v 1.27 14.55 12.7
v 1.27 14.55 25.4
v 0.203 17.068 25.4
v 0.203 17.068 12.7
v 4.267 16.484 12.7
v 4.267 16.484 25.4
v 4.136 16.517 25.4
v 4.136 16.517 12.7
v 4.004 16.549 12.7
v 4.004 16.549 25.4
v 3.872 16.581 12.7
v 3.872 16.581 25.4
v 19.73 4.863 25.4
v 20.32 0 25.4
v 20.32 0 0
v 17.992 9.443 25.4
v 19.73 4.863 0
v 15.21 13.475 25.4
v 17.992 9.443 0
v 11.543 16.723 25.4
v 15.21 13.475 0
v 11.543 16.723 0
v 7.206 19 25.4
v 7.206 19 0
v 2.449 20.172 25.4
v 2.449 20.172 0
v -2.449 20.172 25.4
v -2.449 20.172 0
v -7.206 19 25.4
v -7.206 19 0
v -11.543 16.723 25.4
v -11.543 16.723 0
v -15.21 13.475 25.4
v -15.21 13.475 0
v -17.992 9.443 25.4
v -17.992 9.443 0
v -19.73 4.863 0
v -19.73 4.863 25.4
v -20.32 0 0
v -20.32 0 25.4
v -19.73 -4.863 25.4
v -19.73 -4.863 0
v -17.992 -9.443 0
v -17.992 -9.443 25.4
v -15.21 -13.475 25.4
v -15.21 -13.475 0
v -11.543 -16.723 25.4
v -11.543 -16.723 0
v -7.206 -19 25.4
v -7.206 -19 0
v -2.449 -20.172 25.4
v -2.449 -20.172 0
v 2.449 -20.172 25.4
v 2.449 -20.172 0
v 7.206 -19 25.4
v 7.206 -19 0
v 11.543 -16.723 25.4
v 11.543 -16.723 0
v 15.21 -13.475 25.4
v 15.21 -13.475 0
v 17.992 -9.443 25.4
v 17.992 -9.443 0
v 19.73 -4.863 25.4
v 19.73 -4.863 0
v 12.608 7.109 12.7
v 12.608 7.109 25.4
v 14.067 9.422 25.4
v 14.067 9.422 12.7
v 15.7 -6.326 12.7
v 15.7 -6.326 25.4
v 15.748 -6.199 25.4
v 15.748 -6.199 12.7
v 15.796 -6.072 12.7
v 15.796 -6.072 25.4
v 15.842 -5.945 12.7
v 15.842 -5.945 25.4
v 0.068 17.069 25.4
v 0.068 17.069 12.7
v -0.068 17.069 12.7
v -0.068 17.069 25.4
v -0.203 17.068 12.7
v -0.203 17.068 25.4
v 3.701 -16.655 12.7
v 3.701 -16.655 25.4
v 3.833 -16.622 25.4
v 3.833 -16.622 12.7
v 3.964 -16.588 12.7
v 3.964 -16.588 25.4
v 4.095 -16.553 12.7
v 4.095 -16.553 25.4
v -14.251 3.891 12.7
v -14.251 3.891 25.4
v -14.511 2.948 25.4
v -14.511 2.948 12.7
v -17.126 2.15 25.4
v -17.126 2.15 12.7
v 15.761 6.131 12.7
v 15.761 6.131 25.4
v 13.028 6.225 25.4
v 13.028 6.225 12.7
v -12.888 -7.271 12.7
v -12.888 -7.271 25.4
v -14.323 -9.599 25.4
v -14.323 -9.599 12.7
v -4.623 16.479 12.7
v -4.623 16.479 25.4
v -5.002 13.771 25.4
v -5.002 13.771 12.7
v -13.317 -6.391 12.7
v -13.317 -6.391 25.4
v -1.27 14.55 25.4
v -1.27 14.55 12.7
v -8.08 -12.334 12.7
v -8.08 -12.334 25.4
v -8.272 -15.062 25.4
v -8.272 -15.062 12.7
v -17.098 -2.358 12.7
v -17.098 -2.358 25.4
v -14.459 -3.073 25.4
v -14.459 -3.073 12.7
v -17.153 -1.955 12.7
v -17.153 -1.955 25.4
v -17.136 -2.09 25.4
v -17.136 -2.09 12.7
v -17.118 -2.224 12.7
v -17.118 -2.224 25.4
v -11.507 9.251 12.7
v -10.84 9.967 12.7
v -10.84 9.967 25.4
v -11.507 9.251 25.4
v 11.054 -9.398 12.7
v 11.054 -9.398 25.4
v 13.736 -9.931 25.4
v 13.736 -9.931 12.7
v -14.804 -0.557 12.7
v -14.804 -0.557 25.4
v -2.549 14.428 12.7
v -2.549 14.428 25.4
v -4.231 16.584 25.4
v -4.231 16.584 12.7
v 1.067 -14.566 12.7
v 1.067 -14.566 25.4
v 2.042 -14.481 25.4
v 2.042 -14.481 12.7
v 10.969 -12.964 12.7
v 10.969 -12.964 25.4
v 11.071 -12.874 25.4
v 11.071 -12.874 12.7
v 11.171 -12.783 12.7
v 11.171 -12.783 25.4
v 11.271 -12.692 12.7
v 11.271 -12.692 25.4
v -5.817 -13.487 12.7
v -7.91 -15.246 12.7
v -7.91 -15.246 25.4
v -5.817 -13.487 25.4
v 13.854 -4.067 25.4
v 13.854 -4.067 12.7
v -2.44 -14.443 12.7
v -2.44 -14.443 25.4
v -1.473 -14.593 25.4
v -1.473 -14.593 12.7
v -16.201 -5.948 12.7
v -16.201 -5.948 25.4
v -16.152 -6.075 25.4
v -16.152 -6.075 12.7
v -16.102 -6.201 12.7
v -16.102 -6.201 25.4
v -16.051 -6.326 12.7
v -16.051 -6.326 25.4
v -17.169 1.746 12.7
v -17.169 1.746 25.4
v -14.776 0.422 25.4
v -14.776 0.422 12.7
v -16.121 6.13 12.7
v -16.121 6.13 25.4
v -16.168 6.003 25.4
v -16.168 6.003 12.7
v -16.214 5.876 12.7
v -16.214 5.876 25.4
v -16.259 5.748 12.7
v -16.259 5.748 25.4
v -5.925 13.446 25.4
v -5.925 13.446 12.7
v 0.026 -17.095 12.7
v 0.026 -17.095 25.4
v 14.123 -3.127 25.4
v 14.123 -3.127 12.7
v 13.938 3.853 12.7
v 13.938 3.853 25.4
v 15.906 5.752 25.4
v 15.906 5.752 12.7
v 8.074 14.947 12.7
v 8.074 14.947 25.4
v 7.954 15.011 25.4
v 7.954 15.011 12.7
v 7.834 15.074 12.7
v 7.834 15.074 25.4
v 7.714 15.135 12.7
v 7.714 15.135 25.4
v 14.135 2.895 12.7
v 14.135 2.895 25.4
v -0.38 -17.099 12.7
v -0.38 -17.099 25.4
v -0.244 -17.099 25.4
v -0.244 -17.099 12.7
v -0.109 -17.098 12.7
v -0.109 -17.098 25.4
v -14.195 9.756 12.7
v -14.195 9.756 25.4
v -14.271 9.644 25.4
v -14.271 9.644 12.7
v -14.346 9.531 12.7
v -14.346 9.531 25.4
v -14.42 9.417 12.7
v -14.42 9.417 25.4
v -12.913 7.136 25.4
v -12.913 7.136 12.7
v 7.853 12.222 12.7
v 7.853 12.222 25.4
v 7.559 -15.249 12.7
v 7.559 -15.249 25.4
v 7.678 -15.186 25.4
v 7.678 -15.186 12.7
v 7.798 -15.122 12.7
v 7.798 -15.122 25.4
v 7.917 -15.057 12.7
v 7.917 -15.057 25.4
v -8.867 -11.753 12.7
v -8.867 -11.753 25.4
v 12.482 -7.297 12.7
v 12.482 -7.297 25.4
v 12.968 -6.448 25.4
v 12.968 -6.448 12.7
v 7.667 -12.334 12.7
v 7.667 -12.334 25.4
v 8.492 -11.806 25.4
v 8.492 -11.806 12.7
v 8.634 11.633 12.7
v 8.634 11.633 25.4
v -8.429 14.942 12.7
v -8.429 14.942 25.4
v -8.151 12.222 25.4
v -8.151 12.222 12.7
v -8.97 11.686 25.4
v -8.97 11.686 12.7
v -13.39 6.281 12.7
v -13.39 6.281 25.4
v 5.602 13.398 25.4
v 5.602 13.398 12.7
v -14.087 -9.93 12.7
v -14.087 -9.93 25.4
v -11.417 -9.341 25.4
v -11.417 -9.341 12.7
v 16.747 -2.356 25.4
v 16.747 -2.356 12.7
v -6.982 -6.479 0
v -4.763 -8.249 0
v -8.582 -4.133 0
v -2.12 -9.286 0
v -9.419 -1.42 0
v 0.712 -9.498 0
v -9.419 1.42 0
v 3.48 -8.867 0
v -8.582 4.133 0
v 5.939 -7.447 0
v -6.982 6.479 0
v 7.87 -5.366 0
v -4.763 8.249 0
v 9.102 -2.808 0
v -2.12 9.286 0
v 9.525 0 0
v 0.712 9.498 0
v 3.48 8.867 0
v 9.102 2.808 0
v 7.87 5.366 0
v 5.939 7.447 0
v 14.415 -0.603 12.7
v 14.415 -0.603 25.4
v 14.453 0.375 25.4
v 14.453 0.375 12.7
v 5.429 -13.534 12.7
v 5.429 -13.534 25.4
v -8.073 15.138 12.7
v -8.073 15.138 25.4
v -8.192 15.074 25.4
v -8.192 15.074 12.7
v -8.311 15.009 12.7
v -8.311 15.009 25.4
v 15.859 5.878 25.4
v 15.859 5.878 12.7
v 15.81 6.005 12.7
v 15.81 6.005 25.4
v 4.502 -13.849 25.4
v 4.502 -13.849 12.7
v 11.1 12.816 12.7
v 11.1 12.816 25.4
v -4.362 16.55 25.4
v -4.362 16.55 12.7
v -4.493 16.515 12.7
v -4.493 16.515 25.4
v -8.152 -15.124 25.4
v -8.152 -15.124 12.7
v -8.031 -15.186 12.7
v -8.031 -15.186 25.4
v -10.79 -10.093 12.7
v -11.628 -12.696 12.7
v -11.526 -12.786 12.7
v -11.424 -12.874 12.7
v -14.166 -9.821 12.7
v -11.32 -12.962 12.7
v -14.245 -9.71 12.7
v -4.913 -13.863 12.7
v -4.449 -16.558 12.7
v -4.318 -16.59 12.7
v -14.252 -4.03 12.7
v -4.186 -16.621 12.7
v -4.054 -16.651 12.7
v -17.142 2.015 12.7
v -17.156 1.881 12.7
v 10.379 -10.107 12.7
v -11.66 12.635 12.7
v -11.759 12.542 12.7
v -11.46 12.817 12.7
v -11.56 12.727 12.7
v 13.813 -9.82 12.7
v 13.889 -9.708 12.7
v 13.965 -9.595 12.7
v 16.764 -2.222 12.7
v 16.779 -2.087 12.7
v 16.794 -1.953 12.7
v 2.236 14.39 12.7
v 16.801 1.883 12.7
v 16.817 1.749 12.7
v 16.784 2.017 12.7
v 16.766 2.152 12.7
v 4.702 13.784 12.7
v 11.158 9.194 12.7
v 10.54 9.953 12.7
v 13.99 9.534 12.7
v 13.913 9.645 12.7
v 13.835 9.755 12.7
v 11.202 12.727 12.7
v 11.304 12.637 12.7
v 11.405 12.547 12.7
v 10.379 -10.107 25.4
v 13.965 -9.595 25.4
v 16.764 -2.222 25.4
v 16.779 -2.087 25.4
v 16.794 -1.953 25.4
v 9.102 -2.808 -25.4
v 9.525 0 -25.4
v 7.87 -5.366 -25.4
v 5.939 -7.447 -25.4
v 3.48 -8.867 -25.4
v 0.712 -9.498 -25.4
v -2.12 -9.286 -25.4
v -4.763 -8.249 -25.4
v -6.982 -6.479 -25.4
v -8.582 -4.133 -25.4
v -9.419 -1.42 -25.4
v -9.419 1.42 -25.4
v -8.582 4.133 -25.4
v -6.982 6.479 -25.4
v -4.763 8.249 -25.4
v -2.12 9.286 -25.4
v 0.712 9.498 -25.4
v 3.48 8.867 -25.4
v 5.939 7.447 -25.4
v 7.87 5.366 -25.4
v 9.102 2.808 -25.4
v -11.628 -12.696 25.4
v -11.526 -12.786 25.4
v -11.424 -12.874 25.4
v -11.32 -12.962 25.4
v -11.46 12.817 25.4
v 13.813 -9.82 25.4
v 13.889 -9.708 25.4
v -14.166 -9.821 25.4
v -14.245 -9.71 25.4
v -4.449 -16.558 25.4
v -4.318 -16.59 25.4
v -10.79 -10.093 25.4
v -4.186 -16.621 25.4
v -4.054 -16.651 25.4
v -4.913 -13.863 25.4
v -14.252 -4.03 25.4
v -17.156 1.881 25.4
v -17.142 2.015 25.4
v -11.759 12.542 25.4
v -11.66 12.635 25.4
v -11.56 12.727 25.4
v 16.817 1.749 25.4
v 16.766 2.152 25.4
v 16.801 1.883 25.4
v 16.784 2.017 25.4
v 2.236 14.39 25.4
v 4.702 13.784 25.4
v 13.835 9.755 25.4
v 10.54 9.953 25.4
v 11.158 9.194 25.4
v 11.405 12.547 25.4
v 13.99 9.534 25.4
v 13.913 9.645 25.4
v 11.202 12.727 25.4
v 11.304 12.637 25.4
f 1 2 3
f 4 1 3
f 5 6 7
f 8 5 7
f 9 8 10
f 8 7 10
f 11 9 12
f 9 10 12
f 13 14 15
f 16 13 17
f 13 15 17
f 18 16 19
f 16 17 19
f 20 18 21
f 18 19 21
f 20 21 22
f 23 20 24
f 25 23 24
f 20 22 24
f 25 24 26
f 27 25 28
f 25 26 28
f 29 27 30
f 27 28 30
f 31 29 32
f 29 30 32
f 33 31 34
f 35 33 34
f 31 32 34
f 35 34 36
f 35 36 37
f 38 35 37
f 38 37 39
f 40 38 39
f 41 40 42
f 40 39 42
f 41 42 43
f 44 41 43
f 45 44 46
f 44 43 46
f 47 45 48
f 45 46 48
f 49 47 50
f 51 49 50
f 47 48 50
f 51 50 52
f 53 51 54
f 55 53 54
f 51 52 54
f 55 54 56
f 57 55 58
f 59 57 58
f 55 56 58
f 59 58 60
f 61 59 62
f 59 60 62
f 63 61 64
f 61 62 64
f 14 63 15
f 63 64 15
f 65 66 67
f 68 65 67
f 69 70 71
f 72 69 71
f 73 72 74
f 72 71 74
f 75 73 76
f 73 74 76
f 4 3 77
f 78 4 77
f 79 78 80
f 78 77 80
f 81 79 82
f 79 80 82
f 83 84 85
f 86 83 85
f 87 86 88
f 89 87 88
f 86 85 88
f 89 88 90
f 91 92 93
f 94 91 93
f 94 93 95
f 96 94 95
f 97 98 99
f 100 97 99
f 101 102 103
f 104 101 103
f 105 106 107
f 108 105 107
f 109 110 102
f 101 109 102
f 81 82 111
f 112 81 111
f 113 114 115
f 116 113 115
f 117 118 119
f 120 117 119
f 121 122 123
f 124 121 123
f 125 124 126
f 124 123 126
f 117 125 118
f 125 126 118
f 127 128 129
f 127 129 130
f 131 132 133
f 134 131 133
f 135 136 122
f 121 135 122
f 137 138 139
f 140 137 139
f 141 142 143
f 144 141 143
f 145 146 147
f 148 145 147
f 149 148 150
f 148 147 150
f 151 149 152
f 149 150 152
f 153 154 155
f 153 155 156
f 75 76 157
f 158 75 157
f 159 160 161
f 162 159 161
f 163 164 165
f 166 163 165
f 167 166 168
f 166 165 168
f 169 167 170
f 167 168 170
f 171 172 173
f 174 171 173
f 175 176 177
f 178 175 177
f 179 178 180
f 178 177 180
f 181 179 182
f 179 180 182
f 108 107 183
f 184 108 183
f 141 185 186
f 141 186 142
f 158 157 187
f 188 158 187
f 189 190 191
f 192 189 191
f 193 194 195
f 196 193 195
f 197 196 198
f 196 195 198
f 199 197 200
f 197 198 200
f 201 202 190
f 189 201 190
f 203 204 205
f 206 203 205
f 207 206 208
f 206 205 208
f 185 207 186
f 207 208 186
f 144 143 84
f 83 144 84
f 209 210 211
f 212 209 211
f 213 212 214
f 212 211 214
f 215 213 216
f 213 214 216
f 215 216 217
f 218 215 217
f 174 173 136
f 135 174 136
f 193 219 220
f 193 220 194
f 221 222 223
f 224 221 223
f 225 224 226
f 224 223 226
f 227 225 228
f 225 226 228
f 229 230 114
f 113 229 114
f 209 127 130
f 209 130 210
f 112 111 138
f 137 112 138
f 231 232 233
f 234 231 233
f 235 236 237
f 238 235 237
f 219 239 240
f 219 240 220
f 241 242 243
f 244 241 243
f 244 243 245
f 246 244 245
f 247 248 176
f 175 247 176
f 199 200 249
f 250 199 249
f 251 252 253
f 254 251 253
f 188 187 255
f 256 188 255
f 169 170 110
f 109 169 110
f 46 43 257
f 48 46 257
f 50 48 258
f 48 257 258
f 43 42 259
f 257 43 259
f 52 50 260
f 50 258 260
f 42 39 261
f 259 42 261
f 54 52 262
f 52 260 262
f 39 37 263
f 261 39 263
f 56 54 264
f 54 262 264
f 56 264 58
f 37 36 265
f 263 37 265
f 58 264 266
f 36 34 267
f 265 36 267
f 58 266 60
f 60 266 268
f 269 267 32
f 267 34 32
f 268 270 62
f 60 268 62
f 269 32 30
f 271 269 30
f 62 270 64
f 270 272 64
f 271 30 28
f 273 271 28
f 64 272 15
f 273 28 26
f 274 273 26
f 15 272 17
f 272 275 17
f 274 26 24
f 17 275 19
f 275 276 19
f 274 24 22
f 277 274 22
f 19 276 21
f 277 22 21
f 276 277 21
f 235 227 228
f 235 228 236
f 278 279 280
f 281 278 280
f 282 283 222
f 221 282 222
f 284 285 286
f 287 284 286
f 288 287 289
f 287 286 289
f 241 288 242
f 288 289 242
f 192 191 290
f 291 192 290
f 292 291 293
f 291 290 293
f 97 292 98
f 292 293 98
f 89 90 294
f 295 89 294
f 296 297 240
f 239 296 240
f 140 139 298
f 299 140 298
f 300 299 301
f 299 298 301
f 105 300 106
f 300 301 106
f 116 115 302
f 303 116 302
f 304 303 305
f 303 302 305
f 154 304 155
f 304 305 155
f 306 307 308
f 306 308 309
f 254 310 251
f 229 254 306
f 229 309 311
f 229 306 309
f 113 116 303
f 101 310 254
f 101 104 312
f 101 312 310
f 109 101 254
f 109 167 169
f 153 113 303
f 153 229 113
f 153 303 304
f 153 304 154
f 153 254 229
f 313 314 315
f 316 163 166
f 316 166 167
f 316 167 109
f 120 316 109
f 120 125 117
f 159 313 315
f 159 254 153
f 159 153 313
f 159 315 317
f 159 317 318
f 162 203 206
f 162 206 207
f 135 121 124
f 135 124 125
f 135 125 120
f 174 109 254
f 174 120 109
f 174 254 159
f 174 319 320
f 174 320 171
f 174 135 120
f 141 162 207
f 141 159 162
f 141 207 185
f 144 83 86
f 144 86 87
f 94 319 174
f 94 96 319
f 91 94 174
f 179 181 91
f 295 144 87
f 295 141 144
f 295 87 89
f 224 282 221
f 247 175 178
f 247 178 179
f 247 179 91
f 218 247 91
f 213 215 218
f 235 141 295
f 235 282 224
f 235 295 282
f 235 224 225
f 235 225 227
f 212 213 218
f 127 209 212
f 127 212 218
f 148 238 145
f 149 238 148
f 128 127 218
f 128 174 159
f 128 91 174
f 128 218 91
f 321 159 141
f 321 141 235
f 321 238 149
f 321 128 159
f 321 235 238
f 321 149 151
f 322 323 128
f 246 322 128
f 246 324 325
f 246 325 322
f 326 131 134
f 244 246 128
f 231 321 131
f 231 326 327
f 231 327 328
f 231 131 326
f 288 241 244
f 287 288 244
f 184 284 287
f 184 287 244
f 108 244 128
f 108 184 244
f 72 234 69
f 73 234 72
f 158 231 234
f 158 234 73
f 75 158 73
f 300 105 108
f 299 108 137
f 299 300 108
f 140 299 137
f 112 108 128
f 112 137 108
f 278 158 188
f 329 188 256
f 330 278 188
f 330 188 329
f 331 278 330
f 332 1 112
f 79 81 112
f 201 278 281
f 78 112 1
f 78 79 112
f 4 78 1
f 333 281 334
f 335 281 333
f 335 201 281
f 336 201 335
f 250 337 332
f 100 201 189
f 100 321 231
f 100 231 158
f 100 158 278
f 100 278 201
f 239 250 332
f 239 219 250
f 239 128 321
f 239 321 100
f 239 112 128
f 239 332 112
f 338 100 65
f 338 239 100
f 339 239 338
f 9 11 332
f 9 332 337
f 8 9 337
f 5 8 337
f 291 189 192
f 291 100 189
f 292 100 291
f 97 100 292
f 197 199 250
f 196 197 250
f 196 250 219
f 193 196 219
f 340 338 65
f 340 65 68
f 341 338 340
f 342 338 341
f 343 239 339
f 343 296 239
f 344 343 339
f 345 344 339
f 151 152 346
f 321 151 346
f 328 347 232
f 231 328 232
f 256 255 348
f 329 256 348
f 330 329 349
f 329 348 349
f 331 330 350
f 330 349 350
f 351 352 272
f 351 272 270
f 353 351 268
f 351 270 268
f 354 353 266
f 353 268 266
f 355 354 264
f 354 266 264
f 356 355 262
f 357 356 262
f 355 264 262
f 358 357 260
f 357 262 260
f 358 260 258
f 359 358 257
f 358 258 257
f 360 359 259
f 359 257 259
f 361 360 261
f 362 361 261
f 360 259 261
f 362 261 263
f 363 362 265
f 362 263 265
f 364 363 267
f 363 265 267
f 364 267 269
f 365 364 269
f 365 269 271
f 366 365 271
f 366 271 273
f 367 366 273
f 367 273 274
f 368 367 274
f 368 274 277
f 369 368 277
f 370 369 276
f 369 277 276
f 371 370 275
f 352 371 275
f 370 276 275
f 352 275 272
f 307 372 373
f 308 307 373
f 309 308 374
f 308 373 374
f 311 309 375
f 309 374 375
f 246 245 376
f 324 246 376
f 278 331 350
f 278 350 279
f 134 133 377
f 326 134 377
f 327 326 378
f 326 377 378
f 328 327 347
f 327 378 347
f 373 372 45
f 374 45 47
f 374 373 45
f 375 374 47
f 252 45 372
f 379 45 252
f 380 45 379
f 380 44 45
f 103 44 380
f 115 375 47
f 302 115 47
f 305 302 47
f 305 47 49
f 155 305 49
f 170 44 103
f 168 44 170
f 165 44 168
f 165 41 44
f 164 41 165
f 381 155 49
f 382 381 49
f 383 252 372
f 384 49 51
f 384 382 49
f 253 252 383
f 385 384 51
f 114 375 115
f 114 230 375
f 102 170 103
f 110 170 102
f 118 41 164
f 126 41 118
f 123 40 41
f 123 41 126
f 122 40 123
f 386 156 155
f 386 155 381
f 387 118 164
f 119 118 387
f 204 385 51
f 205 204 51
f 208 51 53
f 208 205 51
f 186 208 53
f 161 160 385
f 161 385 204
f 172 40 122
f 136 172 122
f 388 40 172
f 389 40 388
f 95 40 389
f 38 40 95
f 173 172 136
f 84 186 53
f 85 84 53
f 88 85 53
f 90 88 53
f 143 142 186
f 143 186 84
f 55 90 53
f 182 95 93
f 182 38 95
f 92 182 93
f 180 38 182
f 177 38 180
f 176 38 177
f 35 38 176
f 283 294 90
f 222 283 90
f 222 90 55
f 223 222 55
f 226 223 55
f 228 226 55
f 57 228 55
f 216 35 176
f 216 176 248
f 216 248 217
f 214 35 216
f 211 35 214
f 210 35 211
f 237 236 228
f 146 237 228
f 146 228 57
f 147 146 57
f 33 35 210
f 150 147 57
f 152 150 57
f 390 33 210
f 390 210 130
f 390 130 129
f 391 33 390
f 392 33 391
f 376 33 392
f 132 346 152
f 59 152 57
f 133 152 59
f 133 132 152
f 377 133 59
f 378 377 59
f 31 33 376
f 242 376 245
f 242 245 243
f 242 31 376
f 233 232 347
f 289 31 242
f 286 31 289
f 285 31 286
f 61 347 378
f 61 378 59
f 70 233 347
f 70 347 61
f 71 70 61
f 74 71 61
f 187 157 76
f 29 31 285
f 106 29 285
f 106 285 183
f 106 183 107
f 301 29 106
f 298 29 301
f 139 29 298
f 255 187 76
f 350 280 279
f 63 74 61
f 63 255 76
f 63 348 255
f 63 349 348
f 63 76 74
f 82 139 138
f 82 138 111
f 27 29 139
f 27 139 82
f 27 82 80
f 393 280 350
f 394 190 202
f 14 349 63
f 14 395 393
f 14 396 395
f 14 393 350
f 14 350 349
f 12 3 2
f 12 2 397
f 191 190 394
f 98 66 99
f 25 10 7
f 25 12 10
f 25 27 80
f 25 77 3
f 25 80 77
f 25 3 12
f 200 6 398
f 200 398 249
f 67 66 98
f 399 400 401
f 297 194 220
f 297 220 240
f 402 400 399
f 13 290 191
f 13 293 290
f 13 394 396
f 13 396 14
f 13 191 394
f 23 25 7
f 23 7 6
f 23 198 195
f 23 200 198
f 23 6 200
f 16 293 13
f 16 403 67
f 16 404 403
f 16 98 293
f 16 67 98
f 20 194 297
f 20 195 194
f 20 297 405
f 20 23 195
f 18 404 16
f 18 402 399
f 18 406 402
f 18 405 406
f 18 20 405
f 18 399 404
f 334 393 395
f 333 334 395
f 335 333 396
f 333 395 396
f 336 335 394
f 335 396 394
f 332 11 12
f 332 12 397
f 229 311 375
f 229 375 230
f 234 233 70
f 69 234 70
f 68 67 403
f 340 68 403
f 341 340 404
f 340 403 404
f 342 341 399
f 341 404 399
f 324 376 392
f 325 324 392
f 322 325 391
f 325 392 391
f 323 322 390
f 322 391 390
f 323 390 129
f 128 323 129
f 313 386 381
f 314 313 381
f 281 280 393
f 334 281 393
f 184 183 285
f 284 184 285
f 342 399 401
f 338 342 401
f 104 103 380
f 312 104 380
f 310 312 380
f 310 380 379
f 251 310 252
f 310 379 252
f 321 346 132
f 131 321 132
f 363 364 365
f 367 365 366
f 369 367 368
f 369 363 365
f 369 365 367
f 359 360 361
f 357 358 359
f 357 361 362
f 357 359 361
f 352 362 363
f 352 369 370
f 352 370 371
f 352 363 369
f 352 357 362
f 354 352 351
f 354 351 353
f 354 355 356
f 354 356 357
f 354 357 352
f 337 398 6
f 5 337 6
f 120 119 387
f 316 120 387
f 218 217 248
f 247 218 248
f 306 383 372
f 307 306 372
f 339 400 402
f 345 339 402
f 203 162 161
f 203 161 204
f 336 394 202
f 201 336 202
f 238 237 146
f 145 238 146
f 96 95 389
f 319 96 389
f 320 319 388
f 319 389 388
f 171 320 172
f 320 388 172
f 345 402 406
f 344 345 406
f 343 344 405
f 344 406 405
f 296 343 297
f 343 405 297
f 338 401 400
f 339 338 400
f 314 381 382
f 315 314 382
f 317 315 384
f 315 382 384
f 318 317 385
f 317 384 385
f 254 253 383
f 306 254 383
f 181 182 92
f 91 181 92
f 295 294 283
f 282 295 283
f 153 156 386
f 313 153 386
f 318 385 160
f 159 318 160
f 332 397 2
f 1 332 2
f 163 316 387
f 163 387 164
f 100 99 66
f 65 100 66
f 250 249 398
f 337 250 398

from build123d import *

# Parameters (mm, degrees)
F0_R     = 20.32
F1_DEPTH = 25.4
F3_DEPTH = 12.7
F4_R     = 9.525
F5_DEPTH = 25.4


with BuildPart() as f1:
    # F0 (on Top) → F1 (new body)
    with BuildSketch(Plane.XY):
        Circle(F0_R)
    extrude(amount=F1_DEPTH)

    # F2 (on face) → F3 (cut)
    with BuildSketch(Plane.XY.offset(25.4)):
        with BuildLine():
            Line((1.27, 14.549678), (0.2032, 17.06759))
            ThreePointArc((0.2032, 17.06759), (0, 17.0688), (-0.2032, 17.06759))
            Line((-0.2032, 17.06759), (-1.27, 14.549678))
            Line((-1.27, 14.549678), (-2.5488, 14.428136))
            Line((-2.5488, 14.428136), (-4.230933, 16.584145))
            ThreePointArc((-4.230933, 16.584145), (-4.427523, 16.532721), (-4.623486, 16.478961))
            Line((-4.623486, 16.478961), (-5.002252, 13.770736))
            Line((-5.002252, 13.770736), (-5.925394, 13.445678))
            Line((-5.925394, 13.445678), (-8.073251, 15.138207))
            ThreePointArc((-8.073251, 15.138207), (-8.2519, 15.041375), (-8.429382, 14.942423))
            Line((-8.429382, 14.942423), (-8.151213, 12.222024))
            Line((-8.151213, 12.222024), (-8.970171, 11.686149))
            Line((-8.970171, 11.686149), (-11.459754, 12.817486))
            ThreePointArc((-11.459754, 12.817486), (-11.610147, 12.680835), (-11.758903, 12.542404))
            Line((-11.758903, 12.542404), (-10.839857, 9.966884))
            Line((-10.839857, 9.966884), (-11.507351, 9.251129))
            Line((-11.507351, 9.251129), (-14.194932, 9.75596))
            ThreePointArc((-14.194932, 9.75596), (-14.308389, 9.58738), (-14.419831, 9.417461))
            Line((-14.419831, 9.417461), (-12.912966, 7.135509))
            Line((-12.912966, 7.135509), (-13.390461, 6.281195))
            Line((-13.390461, 6.281195), (-16.120882, 6.130376))
            ThreePointArc((-16.120882, 6.130376), (-16.190851, 5.939599), (-16.258545, 5.748002))
            Line((-16.258545, 5.748002), (-14.250855, 3.891358))
            Line((-14.250855, 3.891358), (-14.510784, 2.947806))
            Line((-14.510784, 2.947806), (-17.126414, 2.150044))
            ThreePointArc((-17.126414, 2.150044), (-17.148857, 1.948083), (-17.168895, 1.74587))
            Line((-17.168895, 1.74587), (-14.776286, 0.42172))
            Line((-14.776286, 0.42172), (-14.803644, -0.556597))
            Line((-14.803644, -0.556597), (-17.153479, -1.955247))
            ThreePointArc((-17.153479, -1.955247), (-17.1271, -2.156731), (-17.098324, -2.357887))
            Line((-17.098324, -2.357887), (-14.458926, -3.073097))
            Line((-14.458926, -3.073097), (-14.252132, -4.0297))
            Line((-14.252132, -4.0297), (-16.200513, -5.948491))
            ThreePointArc((-16.200513, -5.948491), (-16.126835, -6.137867), (-16.050907, -6.326352))
            Line((-16.050907, -6.326352), (-13.317096, -6.391332))
            Line((-13.317096, -6.391332), (-12.888089, -7.270995))
            Line((-12.888089, -7.270995), (-14.322533, -9.599153))
            ThreePointArc((-14.322533, -9.599153), (-14.205809, -9.765488), (-14.087113, -9.930421))
            Line((-14.087113, -9.930421), (-11.416715, -9.34142))
            Line((-11.416715, -9.34142), (-10.790263, -10.093358))
            Line((-10.790263, -10.093358), (-11.627957, -12.696475))
            ThreePointArc((-11.627957, -12.696475), (-11.474926, -12.830166), (-11.320314, -12.962025))
            Line((-11.320314, -12.962025), (-8.867496, -11.753047))
            Line((-8.867496, -11.753047), (-8.079764, -12.33385))
            Line((-8.079764, -12.33385), (-8.272347, -15.061644))
            ThreePointArc((-8.272347, -15.061644), (-8.091843, -15.154973), (-7.910242, -15.246146))
            Line((-7.910242, -15.246146), (-5.816608, -13.486986))
            Line((-5.816608, -13.486986), (-4.913073, -13.863124))
            Line((-4.913073, -13.863124), (-4.449427, -16.558115))
            ThreePointArc((-4.449427, -16.558115), (-4.251872, -16.605694), (-4.053764, -16.650917))
            Line((-4.053764, -16.650917), (-2.440183, -14.443135))
            Line((-2.440183, -14.443135), (-1.473008, -14.592893))
            Line((-1.473008, -14.592893), (-0.3799, -17.099496))
            ThreePointArc((-0.3799, -17.099496), (-0.176698, -17.098577), (0.026478, -17.09524))
            Line((0.026478, -17.09524), (1.066852, -14.566294))
            Line((1.066852, -14.566294), (2.041831, -14.481025))
            Line((2.041831, -14.481025), (3.701295, -16.654531))
            ThreePointArc((3.701295, -16.654531), (3.898411, -16.605168), (4.094927, -16.553463))
            Line((4.094927, -16.553463), (4.502032, -13.849353))
            Line((4.502032, -13.849353), (5.428527, -13.53398))
            Line((5.428527, -13.53398), (7.558543, -15.248908))
            ThreePointArc((7.558543, -15.248908), (7.738196, -15.153952), (7.916705, -15.056864))
            Line((7.916705, -15.056864), (7.667038, -12.333701))
            Line((7.667038, -12.333701), (8.491563, -11.806432))
            Line((8.491563, -11.806432), (10.969162, -12.963777))
            ThreePointArc((10.969162, -12.963777), (11.120978, -12.828709), (11.271176, -12.691842))
            Line((11.271176, -12.691842), (10.37915, -10.10684))
            Line((10.37915, -10.10684), (11.054103, -9.398114))
            Line((11.054103, -9.398114), (13.73625, -9.931061))
            ThreePointArc((13.73625, -9.931061), (13.851466, -9.763679), (13.964681, -9.594936))
            Line((13.964681, -9.594936), (12.481795, -7.297329))
            Line((12.481795, -7.297329), (12.96821, -6.448063))
            Line((12.96821, -6.448063), (15.700061, -6.325844))
            ThreePointArc((15.700061, -6.325844), (15.772024, -6.13581), (15.84172, -5.944933))
            Line((15.84172, -5.944933), (13.853583, -4.067366))
            Line((13.853583, -4.067366), (14.123378, -3.126588))
            Line((14.123378, -3.126588), (16.747219, -2.356259))
            ThreePointArc((16.747219, -2.356259), (16.771776, -2.154545), (16.793929, -1.952553))
            Line((16.793929, -1.952553), (14.415319, -0.603421))
            Line((14.415319, -0.603421), (14.452919, 0.374556))
            Line((14.452919, 0.374556), (16.817272, 1.748523))
            ThreePointArc((16.817272, 1.748523), (16.793004, 1.950272), (16.766336, 2.151718))
            Line((16.766336, 2.151718), (14.134573, 2.894528))
            Line((14.134573, 2.894528), (13.937808, 3.853244))
            Line((13.937808, 3.853244), (15.906174, 5.751527))
            ThreePointArc((15.906174, 5.751527), (15.834483, 5.941664), (15.760534, 6.130934))
            Line((15.760534, 6.130934), (13.027553, 6.224538))
            Line((13.027553, 6.224538), (12.607782, 7.108646))
            Line((12.607782, 7.108646), (14.066526, 9.421655))
            ThreePointArc((14.066526, 9.421655), (13.95155, 9.589202), (13.834588, 9.75537))
            Line((13.834588, 9.75537), (11.158169, 9.194365))
            Line((11.158169, 9.194365), (10.539626, 9.952822))
            Line((10.539626, 9.952822), (11.404533, 12.547024))
            ThreePointArc((11.404533, 12.547024), (11.25291, 12.68231), (11.099687, 12.815781))
            Line((11.099687, 12.815781), (8.634343, 11.632554))
            Line((8.634343, 11.632554), (7.852737, 12.221575))
            Line((7.852737, 12.221575), (8.073874, 14.947202))
            ThreePointArc((8.073874, 14.947202), (7.894358, 15.042416), (7.713721, 15.135486))
            Line((7.713721, 15.135486), (5.60178, 13.398347))
            Line((5.60178, 13.398347), (4.702234, 13.783926))
            Line((4.702234, 13.783926), (4.266835, 16.483624))
            ThreePointArc((4.266835, 16.483624), (4.069789, 16.533269), (3.872166, 16.580564))
            Line((3.872166, 16.580564), (2.235553, 14.389801))
            Line((2.235553, 14.389801), (1.27, 14.549678))
        make_face()
    extrude(amount=-F3_DEPTH, mode=Mode.SUBTRACT)

    # F4 (on face) → F5 (join)
    with BuildSketch(Plane(origin=(0, 0, 0), x_dir=(1, 0, 0), z_dir=(0, 0, -1))):
        Circle(F4_R)
    extrude(amount=F5_DEPTH)


solid = f1.part
